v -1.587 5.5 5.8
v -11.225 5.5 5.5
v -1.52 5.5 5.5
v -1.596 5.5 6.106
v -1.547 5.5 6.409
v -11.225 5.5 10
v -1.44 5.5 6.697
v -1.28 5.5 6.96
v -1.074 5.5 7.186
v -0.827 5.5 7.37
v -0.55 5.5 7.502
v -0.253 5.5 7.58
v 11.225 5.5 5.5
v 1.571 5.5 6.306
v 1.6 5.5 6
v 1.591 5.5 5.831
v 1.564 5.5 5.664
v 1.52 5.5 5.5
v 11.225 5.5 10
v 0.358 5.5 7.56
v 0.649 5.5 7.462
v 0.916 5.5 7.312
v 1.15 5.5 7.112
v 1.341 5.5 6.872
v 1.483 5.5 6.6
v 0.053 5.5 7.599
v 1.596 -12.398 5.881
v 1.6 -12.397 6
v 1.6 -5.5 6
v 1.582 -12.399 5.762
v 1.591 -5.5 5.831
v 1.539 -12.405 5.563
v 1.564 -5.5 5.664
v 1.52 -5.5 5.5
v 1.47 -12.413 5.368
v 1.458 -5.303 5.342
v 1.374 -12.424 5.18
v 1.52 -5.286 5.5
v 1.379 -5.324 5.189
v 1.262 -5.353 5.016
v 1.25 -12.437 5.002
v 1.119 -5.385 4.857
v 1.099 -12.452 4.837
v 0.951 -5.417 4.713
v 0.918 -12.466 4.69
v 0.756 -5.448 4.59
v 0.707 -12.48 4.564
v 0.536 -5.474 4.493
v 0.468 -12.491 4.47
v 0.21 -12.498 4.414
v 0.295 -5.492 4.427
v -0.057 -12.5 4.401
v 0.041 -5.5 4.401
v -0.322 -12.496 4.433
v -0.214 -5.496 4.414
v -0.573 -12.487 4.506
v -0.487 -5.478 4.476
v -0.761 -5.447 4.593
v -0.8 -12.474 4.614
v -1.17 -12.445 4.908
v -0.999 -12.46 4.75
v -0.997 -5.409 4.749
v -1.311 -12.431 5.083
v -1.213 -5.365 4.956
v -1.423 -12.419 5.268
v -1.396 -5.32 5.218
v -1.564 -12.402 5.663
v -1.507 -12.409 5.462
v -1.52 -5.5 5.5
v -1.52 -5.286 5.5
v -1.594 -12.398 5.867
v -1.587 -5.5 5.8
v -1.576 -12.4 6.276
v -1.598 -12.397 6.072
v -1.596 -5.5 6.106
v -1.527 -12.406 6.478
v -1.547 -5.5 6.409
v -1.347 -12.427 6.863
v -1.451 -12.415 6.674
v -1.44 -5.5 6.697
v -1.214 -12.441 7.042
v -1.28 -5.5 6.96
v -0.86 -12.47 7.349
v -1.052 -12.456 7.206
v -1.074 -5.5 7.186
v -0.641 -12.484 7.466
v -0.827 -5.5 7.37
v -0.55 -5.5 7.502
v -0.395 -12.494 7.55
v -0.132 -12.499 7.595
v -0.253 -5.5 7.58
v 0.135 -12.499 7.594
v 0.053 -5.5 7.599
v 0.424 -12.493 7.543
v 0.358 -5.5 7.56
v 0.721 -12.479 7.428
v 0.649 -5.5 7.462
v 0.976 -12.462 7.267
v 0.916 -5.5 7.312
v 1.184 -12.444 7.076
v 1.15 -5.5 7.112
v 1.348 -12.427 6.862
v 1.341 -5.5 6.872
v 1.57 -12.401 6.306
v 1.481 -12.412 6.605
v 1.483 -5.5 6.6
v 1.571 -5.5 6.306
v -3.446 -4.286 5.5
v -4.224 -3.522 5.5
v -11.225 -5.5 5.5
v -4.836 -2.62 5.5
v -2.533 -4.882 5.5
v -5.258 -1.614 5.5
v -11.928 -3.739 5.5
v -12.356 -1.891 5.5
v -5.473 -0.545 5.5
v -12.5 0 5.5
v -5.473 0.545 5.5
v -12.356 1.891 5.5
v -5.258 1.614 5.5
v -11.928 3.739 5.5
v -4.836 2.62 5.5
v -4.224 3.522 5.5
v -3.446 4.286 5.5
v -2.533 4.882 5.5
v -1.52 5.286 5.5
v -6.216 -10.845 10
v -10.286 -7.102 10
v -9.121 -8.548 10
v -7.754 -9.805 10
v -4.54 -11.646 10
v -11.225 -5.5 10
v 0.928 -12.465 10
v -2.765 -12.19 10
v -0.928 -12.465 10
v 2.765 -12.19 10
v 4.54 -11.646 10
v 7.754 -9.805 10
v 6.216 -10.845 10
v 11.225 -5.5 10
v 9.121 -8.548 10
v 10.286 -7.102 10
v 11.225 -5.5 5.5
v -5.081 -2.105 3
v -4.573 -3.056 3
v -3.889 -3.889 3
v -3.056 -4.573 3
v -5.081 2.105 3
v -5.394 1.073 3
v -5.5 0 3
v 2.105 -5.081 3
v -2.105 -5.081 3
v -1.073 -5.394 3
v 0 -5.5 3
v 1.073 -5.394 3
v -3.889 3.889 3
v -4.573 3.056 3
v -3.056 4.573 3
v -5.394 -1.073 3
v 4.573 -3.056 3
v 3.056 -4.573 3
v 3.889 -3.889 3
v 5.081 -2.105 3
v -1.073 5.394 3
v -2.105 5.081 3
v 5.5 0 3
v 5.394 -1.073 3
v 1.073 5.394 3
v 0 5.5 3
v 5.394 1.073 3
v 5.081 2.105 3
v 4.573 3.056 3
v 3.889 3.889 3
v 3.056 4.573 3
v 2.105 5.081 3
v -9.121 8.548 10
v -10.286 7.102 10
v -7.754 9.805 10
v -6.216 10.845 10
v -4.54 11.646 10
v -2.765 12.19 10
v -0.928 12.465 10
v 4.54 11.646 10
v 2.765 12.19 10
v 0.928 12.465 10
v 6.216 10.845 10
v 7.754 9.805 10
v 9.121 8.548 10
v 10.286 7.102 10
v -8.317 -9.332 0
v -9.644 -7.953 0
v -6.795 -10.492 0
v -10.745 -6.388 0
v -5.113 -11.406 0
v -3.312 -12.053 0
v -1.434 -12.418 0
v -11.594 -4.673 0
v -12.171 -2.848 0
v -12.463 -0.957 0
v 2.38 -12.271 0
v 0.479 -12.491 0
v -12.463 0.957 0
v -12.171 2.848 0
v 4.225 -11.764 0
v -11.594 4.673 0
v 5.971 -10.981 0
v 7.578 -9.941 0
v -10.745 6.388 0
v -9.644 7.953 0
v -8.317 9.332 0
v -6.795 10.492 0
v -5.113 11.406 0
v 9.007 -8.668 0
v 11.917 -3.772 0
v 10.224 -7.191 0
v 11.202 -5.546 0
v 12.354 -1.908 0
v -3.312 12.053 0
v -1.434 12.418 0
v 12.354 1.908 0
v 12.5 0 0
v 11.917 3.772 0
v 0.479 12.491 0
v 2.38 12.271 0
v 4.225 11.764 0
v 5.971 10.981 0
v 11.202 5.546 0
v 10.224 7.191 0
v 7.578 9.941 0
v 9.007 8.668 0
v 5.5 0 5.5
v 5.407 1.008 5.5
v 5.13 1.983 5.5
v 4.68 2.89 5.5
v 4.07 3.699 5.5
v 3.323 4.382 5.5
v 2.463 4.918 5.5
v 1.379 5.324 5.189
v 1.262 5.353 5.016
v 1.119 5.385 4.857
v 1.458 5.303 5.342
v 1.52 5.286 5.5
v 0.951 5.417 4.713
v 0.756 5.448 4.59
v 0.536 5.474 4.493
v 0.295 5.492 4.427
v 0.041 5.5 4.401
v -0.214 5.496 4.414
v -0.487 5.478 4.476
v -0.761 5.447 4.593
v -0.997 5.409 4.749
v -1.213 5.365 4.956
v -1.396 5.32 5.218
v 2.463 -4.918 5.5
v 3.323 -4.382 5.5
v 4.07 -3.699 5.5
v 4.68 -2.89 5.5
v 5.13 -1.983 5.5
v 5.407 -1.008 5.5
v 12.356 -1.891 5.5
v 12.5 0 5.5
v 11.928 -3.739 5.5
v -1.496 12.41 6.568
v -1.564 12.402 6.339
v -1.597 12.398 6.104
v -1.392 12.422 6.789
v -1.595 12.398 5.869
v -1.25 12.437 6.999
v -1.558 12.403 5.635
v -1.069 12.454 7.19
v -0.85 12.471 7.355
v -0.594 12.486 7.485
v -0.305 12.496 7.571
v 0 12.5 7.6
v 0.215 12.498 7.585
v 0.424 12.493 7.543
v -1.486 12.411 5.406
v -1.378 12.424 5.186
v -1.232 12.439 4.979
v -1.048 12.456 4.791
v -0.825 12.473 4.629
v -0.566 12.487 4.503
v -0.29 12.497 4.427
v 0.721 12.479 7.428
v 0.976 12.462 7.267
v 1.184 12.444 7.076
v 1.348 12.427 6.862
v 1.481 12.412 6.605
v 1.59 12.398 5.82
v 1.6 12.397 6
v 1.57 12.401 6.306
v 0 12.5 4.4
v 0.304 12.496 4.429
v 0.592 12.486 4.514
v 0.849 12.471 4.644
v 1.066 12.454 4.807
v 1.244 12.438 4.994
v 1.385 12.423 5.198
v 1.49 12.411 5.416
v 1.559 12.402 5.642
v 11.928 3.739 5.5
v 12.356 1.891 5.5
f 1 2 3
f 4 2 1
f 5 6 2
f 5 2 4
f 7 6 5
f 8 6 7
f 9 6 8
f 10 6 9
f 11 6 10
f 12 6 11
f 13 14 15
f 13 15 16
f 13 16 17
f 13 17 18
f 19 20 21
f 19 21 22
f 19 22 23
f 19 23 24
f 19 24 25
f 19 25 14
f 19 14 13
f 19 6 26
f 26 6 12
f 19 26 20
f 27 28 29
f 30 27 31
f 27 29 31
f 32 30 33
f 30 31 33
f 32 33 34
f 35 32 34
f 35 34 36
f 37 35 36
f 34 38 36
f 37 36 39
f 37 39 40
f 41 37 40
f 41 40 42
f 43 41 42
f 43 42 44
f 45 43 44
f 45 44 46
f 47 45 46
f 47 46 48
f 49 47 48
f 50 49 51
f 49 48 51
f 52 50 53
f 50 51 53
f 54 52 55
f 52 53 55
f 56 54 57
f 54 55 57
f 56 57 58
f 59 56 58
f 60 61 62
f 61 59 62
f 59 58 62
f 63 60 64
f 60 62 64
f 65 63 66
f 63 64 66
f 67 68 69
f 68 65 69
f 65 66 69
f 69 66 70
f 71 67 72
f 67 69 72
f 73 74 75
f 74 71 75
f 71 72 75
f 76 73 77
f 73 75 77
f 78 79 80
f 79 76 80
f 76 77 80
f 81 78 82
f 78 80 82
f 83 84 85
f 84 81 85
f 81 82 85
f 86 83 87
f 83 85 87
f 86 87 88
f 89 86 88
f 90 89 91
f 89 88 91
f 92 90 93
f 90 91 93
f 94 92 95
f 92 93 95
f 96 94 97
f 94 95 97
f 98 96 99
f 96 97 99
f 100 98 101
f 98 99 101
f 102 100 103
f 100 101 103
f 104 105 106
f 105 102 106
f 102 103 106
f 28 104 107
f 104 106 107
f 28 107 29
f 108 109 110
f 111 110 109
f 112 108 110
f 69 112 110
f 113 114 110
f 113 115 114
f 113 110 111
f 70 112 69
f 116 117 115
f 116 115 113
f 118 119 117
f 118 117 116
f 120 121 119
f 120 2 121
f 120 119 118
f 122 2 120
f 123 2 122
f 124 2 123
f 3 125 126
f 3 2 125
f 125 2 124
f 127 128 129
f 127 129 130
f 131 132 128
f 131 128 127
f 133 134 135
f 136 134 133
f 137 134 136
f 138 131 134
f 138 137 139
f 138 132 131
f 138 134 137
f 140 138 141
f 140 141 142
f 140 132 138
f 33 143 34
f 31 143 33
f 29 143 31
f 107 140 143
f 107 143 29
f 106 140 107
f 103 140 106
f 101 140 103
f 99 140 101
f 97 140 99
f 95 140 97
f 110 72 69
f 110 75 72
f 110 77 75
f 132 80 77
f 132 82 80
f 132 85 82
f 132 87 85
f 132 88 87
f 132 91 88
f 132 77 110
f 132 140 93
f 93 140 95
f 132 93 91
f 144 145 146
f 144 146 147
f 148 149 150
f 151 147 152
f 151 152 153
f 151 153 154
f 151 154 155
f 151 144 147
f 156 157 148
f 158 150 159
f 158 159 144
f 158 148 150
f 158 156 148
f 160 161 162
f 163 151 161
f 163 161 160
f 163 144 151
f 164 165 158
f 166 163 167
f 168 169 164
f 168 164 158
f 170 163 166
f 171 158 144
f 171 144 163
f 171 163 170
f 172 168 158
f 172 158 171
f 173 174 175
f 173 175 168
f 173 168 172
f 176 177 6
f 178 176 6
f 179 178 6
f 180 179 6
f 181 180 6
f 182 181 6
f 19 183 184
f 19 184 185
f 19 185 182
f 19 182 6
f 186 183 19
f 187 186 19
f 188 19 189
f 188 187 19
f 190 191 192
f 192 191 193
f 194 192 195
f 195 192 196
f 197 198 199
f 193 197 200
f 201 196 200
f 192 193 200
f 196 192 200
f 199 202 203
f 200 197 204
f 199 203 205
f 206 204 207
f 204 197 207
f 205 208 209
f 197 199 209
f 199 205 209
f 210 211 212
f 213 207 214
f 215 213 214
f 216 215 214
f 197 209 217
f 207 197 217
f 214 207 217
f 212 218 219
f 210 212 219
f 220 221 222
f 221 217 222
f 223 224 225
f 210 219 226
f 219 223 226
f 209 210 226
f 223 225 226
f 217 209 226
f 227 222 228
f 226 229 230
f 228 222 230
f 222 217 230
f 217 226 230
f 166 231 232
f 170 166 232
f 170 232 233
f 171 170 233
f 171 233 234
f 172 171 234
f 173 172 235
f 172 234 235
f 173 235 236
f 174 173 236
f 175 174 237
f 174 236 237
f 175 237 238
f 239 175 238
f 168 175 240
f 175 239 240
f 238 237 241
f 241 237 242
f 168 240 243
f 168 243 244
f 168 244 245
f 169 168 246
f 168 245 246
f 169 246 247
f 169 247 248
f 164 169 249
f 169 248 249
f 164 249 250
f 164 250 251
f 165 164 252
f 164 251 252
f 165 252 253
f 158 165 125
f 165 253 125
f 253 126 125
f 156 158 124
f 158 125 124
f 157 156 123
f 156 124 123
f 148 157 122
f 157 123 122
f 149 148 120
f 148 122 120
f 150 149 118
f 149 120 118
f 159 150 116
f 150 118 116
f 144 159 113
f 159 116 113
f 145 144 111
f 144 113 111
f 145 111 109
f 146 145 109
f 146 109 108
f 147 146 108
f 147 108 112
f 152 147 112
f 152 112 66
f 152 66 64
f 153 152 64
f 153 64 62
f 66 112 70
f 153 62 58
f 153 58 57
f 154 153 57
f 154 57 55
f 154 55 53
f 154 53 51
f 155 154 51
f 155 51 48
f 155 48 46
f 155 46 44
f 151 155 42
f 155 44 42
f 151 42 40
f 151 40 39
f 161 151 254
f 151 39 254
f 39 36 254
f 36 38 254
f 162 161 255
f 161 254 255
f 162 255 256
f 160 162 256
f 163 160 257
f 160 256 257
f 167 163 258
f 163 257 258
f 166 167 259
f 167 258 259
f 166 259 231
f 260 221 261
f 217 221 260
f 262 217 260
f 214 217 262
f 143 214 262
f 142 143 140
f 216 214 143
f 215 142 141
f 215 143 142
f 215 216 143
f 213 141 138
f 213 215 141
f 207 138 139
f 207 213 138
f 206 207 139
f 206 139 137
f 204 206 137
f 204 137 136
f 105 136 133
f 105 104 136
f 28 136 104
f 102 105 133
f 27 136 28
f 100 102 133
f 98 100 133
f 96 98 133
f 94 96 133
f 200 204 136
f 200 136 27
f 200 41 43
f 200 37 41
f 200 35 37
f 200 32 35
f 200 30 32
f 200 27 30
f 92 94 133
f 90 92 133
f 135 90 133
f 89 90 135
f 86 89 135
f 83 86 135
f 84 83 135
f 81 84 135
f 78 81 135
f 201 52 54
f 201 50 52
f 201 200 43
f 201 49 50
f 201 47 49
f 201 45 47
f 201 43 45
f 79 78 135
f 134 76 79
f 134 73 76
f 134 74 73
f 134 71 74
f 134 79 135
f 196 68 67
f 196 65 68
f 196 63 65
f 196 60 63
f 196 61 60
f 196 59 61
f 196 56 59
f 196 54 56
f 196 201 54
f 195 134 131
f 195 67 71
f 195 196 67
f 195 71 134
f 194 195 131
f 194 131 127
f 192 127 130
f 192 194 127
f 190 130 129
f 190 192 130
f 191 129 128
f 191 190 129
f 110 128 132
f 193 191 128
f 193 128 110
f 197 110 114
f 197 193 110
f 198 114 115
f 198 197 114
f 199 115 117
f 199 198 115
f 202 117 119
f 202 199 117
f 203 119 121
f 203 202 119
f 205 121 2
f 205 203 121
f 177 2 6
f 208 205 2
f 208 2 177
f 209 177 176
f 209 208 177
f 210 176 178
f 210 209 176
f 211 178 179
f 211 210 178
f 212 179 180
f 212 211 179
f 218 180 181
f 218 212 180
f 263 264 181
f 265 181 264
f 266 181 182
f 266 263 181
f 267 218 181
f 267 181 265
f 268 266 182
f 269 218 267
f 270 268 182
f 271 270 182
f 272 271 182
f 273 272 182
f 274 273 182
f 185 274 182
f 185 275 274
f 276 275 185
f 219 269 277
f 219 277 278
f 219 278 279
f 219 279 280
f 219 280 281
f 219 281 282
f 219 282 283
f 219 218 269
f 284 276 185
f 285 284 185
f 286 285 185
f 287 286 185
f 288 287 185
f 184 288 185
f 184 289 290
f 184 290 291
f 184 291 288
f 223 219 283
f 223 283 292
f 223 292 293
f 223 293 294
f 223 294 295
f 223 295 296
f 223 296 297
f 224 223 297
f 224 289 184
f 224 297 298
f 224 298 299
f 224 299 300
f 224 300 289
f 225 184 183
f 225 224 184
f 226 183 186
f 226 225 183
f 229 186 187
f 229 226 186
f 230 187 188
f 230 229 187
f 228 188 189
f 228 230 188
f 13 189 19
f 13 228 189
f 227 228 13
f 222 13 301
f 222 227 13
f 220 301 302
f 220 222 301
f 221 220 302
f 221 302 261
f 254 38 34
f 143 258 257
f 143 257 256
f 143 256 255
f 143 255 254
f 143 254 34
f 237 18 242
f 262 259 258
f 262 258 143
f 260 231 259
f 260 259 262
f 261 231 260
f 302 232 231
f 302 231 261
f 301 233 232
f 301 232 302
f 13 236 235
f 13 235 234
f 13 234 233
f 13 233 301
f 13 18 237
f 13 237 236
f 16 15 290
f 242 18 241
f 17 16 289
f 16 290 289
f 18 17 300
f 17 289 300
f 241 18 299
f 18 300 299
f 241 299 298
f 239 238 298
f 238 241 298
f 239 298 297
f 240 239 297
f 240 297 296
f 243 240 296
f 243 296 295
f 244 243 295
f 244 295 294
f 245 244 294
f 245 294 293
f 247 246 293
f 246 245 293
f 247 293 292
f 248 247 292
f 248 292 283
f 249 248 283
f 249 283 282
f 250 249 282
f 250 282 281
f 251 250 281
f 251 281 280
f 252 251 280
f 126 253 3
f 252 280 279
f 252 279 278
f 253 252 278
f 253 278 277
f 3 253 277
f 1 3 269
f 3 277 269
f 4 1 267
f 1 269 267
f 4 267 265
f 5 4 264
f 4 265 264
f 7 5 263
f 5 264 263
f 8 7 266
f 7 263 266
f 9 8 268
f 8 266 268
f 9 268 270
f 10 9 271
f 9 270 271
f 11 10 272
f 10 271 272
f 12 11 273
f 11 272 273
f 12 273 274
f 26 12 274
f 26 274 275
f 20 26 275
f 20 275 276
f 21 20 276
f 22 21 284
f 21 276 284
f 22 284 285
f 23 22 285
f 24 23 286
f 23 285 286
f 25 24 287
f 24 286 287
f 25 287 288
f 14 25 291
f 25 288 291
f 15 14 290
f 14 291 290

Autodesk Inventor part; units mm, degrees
ref_plane "YZ Plane" through (0, 0, 0) normal (1, 0, 0) x (0, 1, 0)
ref_plane "XZ Plane" through (0, 0, 0) normal (0, 1, 0) x (-1, 0, 0)
ref_plane "XY Plane" through (0, 0, 0) normal (0, 0, 1) x (1, 0, 0)
sketch "Sketch1" plane through (0, 0, 0) normal (0, 0, 1) x (1, 0, 0)
  line L0 (-17.5, 0) -> (17.5, 0) construction
  line L1 (0, -17.5) -> (0, 17.5) construction
  circle A0 centre (0, 0) radius 12.5
  dimension "d0" = 25
extrude "Extrusion1" add sketch "Sketch1" along normal blind 10
sketch "Sketch2" plane through (0, 0, 10) normal (0, 0, 1) x (1, 0, 0)
  circle A0 centre (0, 0) radius 12.5 construction
  circle A1 centre (0, 0) radius 5.5
  dimension "d3" = 11
extrude "Extrusion2" cut sketch "Sketch2" against normal blind 7
sketch "Sketch3" plane through (0, 0, 10) normal (0, 0, 1) x (1, 0, 0)
  circle A0 centre (0, 0) radius 5.5 projected
  circle A1 centre (0, 0) radius 12.5 construction
  line L0 (13.9889, -5.5) -> (-13.9889, -5.5)
  line L1 (-13.9889, -5.5) -> (-13.9889, 5.5)
  line L2 (-13.9889, 5.5) -> (13.9889, 5.5)
  line L3 (13.9889, 5.5) -> (13.9889, -5.5)
  line L4 (13.9889, -5.5) -> (-13.9889, 5.5) construction
  line L5 (-13.9889, -5.5) -> (13.9889, 5.5) construction
  circle A2 centre (0, 0) radius 5.5 construction
extrude "Extrusion3" cut sketch "Sketch3" against normal blind 4.5 contours A0 L2 L3 L0 | A0 L0 L1 L2
ref_plane "Work Plane1" through (0, 12.5, 0) normal (0, -1, 0) x (1, 0, 0)
sketch "Sketch4" plane through (0, 12.5, 0) normal (0, -1, 0) x (1, 0, 0)
  line L0 (-12.5, 0) -> (12.5, 0) construction
  line L1 (-11.225, 10) -> (-11.225, 5.5) construction
  line L2 (-11.225, 5.5) -> (-11.225, 5.5) construction
  line L3 (-11.225, 5.5) -> (-11.225, 10) construction
  line L4 (11.225, 10) -> (-11.225, 10) construction
  line L5 (11.225, 10) -> (11.225, 5.5) construction
  line L6 (11.225, 5.5) -> (11.225, 5.5) construction
  line L7 (11.225, 5.5) -> (11.225, 10) construction
  line L8 (-11.225, 10) -> (11.225, 10) construction
  line L9 (0, -2) -> (0, 12) construction
  circle A0 centre (0, 6) radius 1.6
  point P0 (0, 0)
  dimension "d8" = 3.2
  dimension "d9" = 4
extrude "Extrusion4" cut sketch "Sketch4" along normal through all
